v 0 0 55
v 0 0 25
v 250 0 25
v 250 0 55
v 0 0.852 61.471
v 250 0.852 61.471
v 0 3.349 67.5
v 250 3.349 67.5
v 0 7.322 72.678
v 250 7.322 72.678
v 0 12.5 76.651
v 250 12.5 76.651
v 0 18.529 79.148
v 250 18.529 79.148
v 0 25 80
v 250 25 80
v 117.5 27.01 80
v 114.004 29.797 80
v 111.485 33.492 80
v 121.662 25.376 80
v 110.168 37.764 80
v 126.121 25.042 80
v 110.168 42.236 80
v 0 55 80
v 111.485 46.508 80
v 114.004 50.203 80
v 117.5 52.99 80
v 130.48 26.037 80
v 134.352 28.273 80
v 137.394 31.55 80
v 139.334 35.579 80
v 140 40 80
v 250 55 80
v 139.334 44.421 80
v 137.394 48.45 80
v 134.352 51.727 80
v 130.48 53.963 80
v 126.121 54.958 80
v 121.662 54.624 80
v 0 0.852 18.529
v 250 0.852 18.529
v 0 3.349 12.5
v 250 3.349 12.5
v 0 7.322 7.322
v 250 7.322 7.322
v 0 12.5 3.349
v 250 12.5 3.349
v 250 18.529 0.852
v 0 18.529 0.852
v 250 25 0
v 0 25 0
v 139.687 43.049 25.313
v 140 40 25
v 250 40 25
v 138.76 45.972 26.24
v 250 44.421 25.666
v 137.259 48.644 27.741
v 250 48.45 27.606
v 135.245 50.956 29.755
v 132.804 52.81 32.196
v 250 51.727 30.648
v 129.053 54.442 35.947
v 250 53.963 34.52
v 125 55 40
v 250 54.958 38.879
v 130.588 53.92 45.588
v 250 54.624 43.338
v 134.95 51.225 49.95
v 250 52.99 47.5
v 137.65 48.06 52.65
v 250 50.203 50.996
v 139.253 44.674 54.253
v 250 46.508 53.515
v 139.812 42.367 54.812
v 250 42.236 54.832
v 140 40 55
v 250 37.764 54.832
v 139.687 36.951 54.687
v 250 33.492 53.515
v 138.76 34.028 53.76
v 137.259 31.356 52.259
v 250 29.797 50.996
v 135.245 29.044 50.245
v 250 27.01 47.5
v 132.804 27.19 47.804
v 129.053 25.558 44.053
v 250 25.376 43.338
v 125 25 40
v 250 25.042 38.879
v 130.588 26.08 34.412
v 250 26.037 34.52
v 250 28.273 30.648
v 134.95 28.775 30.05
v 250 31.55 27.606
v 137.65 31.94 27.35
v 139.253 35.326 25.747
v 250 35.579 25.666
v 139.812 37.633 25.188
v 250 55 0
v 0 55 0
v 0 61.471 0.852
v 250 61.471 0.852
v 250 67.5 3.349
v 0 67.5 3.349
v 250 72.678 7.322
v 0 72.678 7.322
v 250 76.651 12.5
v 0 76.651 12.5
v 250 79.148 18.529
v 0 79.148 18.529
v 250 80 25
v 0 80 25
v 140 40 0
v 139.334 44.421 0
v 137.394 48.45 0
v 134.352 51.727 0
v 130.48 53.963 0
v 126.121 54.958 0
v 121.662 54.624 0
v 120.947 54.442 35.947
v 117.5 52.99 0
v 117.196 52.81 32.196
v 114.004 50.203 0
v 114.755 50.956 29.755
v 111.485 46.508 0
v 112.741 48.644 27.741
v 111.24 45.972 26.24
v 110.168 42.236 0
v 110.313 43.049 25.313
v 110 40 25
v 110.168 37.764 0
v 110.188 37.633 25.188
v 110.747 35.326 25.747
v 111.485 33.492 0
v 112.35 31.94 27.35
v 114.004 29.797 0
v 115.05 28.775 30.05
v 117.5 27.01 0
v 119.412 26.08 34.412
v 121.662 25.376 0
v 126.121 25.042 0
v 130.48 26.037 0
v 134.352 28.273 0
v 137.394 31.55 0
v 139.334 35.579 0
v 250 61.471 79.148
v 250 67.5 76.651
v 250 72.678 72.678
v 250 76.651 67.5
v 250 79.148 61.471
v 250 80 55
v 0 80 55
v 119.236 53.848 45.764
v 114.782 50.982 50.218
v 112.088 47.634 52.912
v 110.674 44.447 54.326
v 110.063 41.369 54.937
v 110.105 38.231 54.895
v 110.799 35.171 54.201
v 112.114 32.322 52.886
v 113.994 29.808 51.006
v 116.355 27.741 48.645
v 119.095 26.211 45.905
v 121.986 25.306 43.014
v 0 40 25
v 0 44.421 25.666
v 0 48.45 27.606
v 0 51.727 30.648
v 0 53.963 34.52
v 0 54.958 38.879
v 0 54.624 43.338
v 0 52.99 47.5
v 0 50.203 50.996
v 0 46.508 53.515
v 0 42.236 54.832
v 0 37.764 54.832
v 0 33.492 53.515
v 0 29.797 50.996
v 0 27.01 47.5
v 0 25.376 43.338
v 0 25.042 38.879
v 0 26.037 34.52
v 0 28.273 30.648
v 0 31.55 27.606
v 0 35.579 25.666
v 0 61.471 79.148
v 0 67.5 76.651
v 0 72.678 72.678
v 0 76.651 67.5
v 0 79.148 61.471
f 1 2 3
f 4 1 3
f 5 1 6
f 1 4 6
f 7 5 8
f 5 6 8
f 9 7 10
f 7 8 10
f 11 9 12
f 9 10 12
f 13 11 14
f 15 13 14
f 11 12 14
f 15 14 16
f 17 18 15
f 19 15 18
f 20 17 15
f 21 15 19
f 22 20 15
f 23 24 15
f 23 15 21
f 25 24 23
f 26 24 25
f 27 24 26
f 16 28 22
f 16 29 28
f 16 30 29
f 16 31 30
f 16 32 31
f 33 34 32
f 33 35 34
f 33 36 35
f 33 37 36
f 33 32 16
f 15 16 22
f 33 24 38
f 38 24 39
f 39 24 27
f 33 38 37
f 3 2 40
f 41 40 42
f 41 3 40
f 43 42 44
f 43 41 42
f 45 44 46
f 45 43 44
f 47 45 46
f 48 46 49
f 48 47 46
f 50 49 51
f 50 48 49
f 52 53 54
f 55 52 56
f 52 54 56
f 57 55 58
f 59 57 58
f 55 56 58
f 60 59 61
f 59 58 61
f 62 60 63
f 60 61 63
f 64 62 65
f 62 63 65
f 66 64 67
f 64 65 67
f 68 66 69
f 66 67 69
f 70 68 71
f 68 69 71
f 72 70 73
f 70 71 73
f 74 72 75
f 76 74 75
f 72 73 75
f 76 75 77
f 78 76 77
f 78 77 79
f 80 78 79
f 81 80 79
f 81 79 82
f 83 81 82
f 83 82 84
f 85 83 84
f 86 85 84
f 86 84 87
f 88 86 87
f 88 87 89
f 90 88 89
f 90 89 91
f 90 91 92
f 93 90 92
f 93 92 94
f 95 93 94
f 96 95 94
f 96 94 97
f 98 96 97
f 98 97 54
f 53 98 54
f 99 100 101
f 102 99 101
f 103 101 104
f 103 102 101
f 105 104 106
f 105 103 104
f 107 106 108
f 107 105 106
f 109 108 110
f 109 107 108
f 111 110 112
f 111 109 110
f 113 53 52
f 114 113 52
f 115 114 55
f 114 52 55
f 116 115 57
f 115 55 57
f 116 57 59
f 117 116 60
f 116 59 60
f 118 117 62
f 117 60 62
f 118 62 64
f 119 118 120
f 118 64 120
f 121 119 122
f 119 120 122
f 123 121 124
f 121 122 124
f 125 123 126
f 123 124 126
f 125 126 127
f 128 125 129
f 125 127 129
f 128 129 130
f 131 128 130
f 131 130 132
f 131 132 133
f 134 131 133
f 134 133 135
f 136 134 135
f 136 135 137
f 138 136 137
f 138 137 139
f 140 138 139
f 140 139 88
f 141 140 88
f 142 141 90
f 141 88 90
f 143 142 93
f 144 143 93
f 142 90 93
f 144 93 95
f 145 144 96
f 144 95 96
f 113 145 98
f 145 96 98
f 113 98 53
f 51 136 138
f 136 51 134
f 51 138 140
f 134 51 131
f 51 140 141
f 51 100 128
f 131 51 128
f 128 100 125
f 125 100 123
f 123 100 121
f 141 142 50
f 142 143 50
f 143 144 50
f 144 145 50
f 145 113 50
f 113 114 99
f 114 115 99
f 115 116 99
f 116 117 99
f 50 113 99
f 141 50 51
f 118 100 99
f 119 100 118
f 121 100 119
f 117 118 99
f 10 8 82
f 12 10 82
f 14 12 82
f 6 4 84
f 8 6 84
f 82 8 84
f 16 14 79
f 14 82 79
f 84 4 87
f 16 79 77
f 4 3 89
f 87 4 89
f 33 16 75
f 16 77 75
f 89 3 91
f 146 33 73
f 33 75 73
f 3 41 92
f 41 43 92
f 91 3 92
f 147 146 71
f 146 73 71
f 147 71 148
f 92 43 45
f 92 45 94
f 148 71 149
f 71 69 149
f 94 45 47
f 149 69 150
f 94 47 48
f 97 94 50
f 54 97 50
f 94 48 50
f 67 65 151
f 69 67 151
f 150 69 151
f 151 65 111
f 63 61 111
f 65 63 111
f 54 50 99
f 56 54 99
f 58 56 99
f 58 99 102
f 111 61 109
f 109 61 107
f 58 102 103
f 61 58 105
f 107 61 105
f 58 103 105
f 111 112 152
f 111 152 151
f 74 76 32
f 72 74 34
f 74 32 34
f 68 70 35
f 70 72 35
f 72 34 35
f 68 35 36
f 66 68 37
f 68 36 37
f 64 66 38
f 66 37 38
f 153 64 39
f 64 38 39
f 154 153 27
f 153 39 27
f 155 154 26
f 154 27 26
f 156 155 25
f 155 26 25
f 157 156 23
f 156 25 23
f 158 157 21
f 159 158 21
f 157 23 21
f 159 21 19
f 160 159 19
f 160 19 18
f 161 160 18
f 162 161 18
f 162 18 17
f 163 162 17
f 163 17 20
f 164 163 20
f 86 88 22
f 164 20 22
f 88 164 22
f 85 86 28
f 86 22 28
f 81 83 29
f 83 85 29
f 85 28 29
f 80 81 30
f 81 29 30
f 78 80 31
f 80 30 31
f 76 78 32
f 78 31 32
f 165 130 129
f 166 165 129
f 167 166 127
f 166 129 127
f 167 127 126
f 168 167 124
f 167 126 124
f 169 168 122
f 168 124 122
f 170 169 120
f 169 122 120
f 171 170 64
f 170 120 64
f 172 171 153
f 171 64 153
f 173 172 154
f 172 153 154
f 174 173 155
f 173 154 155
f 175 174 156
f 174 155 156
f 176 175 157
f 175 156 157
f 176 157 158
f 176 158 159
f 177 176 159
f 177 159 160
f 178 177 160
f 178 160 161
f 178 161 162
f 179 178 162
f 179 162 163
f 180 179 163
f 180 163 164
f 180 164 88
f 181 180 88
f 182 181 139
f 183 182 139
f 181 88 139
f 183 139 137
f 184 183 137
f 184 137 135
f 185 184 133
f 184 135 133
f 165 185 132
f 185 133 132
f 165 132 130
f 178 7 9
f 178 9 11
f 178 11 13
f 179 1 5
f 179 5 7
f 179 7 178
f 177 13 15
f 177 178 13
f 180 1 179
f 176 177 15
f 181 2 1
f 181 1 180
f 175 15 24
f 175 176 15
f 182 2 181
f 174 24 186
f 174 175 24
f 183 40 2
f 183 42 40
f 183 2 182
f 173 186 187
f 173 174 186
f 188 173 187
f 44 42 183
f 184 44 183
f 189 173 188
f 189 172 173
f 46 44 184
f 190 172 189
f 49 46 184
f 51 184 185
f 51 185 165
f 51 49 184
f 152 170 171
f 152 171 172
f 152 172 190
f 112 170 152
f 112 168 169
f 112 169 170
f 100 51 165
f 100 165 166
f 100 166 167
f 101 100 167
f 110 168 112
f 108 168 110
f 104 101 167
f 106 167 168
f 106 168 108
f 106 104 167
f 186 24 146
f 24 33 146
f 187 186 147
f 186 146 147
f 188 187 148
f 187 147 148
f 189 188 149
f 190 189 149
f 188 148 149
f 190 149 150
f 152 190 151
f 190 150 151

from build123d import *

# Parameters (mm, degrees)
ESQUISSE1_W             = 250
ESQUISSE1_H             = 80
BOSS_EXTRU_1_DEPTH      = 80
ESQUISSE2_R             = 15
ENL_V_MAT_EXTRU_1_DEPTH = 275.40845468
ESQUISSE3_R             = 15
ENL_V_MAT_EXTRU_2_DEPTH = 80
CONG_1_R                = 25


with BuildPart() as part:
    # Esquisse1 → Boss.-Extru.1 (new body)
    with BuildSketch(Plane.XY):
        with Locations((125, 40)):
            Rectangle(ESQUISSE1_W, ESQUISSE1_H)
    extrude(amount=BOSS_EXTRU_1_DEPTH)

    # Esquisse2 → Enlèv. mat.-Extru.1 (cut, through all)
    with BuildSketch(Plane(origin=(250, 0, 0), x_dir=(0, 0, -1), z_dir=(1, 0, 0))):
        with Locations((-40, 40)):
            Circle(ESQUISSE2_R)
    extrude(amount=-ENL_V_MAT_EXTRU_1_DEPTH, mode=Mode.SUBTRACT)

    # Esquisse3 → Enlèv. mat.-Extru.2 (cut)
    with BuildSketch(Plane.XY.offset(80)):
        with Locations((125, 40)):
            Circle(ESQUISSE3_R)
    extrude(amount=-ENL_V_MAT_EXTRU_2_DEPTH, mode=Mode.SUBTRACT)

    # Congé1
    cong_1_edges = [part.edges().sort_by_distance(p)[0] for p in [
        (125, 80, 80),
        (125, 80, 0),
        (125, 0, 0),
        (125, 0, 80),
    ]]
    fillet(cong_1_edges, radius=CONG_1_R - 0.0001)  # a hair under: the kernel refuses the full size


solid = part.part
